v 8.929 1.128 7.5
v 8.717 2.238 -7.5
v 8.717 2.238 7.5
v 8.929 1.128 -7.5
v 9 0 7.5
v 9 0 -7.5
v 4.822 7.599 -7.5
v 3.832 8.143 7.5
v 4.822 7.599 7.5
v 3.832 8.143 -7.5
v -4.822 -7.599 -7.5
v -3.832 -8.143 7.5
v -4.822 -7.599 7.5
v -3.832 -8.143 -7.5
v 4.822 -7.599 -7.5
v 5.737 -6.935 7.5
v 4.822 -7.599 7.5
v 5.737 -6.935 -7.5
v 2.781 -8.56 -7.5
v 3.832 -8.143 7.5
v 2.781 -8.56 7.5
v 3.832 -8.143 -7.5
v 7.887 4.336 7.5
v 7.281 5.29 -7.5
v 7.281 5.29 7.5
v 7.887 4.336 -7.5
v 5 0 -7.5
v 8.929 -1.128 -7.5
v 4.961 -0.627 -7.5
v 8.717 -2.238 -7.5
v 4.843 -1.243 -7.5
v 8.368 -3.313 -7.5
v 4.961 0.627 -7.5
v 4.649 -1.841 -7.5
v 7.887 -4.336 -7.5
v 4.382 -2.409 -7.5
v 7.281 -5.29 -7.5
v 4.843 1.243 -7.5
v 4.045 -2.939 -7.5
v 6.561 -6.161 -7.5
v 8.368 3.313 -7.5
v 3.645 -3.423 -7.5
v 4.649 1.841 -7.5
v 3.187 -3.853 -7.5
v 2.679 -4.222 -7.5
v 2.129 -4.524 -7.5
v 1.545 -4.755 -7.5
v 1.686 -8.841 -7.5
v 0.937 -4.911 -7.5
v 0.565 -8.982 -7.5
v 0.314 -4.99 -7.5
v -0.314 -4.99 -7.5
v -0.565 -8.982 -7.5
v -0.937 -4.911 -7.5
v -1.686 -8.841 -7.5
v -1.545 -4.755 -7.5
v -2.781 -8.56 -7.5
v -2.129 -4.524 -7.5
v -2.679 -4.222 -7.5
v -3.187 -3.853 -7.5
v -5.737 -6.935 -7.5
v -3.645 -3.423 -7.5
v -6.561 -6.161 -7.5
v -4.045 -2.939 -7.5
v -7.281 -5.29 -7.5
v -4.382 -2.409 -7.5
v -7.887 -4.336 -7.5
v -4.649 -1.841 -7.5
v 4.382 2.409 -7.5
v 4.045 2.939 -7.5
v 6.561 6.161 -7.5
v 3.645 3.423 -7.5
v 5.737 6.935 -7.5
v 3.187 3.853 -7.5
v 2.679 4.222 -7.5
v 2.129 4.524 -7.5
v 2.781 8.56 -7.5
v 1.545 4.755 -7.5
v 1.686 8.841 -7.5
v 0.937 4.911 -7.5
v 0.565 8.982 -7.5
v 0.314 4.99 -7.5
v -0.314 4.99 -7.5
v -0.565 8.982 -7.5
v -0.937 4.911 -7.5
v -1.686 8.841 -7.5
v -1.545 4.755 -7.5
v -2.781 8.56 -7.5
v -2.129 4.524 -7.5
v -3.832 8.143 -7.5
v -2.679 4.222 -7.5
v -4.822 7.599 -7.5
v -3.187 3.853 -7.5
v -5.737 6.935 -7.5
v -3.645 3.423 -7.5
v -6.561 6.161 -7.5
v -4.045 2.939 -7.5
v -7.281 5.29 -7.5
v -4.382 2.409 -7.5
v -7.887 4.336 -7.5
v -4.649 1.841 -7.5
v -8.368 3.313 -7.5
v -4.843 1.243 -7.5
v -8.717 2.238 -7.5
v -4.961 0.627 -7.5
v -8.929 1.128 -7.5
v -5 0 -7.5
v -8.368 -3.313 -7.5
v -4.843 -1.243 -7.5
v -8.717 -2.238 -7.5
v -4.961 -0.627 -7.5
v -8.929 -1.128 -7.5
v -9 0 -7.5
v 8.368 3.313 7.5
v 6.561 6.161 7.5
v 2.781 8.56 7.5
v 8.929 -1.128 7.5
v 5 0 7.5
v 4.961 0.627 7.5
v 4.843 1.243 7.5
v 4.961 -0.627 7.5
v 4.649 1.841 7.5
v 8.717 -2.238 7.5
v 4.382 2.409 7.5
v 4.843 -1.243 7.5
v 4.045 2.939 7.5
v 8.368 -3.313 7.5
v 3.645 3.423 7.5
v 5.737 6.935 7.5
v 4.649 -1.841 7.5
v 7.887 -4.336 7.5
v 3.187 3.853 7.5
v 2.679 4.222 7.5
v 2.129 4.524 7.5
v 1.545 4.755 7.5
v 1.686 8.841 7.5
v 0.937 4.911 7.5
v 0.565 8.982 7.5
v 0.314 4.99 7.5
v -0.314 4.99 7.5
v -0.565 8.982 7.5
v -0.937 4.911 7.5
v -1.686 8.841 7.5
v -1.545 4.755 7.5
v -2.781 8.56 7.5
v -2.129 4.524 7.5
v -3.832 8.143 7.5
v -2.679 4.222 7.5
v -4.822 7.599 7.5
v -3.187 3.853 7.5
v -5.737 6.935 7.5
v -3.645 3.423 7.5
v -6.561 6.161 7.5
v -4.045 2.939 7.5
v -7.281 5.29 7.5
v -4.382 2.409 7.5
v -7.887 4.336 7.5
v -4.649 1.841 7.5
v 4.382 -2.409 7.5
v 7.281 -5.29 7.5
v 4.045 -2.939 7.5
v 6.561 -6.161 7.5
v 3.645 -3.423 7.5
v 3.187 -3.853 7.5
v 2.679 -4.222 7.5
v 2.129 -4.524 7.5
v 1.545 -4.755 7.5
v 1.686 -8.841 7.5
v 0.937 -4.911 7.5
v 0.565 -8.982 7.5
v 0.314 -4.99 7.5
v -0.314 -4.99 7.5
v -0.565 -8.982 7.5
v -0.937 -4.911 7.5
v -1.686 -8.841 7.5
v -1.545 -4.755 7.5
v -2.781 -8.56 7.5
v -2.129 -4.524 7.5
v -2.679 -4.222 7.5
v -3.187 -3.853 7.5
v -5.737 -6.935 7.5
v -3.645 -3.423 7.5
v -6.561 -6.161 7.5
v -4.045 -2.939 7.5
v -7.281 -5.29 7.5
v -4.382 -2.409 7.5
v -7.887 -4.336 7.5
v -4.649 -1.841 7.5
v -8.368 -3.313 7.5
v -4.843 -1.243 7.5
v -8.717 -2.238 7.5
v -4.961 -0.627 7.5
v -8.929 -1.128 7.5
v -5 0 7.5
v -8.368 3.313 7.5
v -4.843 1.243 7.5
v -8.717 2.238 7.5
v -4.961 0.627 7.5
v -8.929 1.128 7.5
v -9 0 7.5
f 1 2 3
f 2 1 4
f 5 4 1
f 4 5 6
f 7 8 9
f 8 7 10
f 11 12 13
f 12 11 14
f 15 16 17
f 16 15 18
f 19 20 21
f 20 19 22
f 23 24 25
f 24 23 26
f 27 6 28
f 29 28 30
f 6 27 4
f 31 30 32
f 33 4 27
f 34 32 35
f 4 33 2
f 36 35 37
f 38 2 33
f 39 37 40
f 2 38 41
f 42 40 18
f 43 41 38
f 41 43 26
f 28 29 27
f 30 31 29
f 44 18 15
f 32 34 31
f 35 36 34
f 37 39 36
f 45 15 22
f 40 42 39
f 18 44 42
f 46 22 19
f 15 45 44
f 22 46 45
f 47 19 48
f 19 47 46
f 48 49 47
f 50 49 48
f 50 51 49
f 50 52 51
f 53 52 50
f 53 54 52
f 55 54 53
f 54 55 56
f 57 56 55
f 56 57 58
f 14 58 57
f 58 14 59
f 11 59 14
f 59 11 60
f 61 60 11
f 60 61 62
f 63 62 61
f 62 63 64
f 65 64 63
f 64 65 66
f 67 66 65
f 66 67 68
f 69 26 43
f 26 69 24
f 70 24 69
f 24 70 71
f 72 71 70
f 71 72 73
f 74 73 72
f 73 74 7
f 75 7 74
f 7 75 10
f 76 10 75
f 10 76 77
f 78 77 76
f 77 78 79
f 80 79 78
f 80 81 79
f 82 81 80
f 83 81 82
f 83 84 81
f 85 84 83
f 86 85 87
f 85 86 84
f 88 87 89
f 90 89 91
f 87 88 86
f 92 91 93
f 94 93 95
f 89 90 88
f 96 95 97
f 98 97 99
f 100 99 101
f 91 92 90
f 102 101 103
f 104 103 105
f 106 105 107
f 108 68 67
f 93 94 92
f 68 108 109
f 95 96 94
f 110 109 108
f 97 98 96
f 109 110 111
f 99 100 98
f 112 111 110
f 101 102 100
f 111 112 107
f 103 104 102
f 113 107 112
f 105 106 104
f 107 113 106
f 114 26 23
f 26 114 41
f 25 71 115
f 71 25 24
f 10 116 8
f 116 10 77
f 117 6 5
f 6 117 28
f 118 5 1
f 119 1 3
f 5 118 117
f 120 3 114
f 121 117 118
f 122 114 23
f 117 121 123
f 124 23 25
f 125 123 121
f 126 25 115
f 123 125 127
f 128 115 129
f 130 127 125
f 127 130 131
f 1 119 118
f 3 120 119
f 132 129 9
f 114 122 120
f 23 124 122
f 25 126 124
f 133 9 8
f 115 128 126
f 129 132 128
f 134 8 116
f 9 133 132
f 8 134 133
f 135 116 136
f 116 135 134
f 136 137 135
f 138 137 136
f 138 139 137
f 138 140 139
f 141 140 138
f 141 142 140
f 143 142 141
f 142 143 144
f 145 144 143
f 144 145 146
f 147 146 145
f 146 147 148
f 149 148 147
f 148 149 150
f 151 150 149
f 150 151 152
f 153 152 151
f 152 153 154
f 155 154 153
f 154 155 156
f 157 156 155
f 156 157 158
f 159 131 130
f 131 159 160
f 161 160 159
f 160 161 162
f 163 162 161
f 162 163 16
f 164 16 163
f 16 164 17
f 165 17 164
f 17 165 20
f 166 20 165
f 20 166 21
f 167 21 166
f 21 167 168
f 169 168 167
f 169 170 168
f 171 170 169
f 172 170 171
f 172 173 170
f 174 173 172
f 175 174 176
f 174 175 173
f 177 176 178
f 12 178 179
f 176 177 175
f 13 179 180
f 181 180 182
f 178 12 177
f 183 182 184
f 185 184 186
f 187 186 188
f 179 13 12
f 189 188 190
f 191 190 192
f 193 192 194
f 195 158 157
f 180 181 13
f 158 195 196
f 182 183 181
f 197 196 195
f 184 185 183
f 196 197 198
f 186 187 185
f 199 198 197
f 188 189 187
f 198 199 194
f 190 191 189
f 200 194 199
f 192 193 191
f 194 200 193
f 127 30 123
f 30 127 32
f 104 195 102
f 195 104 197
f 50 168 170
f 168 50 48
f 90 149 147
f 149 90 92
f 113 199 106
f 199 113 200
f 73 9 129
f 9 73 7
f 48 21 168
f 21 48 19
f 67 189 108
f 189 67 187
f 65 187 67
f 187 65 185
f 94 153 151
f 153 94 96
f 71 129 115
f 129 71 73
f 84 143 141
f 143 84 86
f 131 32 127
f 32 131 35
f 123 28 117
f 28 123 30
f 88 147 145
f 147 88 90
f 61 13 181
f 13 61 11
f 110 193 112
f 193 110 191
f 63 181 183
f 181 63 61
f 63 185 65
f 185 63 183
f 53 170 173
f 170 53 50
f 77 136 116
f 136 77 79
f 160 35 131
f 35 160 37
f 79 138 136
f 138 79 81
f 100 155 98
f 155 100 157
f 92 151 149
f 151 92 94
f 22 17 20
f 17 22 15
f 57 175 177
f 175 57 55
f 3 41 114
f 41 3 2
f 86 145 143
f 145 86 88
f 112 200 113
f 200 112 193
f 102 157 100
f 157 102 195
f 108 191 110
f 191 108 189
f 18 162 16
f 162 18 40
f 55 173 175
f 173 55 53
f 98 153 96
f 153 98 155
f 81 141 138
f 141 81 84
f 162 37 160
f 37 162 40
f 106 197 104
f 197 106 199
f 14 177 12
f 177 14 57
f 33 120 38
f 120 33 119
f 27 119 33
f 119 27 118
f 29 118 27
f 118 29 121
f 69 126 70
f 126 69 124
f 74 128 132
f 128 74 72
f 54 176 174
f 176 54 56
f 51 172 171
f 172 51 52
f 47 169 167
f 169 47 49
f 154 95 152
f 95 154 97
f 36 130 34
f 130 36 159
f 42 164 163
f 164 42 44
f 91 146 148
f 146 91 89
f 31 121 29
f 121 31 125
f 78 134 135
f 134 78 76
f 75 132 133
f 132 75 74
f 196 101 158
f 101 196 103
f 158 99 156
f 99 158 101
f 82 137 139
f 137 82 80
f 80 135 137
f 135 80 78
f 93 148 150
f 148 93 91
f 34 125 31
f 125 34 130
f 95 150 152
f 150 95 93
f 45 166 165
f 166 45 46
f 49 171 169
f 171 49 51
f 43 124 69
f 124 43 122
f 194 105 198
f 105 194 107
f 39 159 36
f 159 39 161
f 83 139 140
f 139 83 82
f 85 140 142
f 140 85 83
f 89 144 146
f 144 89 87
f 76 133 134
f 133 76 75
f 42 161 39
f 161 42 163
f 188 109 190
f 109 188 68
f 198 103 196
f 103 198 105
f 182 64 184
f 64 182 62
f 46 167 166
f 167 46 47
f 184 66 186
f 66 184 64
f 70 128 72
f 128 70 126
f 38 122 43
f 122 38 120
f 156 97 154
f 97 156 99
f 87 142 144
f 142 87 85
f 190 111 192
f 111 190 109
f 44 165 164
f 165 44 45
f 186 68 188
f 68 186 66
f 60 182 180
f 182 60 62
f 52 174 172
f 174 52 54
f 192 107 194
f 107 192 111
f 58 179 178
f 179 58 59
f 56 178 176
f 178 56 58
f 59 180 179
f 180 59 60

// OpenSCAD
$fn = 50;


difference() {
	union() {
		translate(v = [0, 0, -7.5000000000]) {
			cylinder(h = 15, r = 9.0000000000);
		}
	}
	union() {
		translate(v = [0, 0, -100.0000000000]) {
			cylinder(h = 200, r = 5.0000000000);
		}
	}
}
